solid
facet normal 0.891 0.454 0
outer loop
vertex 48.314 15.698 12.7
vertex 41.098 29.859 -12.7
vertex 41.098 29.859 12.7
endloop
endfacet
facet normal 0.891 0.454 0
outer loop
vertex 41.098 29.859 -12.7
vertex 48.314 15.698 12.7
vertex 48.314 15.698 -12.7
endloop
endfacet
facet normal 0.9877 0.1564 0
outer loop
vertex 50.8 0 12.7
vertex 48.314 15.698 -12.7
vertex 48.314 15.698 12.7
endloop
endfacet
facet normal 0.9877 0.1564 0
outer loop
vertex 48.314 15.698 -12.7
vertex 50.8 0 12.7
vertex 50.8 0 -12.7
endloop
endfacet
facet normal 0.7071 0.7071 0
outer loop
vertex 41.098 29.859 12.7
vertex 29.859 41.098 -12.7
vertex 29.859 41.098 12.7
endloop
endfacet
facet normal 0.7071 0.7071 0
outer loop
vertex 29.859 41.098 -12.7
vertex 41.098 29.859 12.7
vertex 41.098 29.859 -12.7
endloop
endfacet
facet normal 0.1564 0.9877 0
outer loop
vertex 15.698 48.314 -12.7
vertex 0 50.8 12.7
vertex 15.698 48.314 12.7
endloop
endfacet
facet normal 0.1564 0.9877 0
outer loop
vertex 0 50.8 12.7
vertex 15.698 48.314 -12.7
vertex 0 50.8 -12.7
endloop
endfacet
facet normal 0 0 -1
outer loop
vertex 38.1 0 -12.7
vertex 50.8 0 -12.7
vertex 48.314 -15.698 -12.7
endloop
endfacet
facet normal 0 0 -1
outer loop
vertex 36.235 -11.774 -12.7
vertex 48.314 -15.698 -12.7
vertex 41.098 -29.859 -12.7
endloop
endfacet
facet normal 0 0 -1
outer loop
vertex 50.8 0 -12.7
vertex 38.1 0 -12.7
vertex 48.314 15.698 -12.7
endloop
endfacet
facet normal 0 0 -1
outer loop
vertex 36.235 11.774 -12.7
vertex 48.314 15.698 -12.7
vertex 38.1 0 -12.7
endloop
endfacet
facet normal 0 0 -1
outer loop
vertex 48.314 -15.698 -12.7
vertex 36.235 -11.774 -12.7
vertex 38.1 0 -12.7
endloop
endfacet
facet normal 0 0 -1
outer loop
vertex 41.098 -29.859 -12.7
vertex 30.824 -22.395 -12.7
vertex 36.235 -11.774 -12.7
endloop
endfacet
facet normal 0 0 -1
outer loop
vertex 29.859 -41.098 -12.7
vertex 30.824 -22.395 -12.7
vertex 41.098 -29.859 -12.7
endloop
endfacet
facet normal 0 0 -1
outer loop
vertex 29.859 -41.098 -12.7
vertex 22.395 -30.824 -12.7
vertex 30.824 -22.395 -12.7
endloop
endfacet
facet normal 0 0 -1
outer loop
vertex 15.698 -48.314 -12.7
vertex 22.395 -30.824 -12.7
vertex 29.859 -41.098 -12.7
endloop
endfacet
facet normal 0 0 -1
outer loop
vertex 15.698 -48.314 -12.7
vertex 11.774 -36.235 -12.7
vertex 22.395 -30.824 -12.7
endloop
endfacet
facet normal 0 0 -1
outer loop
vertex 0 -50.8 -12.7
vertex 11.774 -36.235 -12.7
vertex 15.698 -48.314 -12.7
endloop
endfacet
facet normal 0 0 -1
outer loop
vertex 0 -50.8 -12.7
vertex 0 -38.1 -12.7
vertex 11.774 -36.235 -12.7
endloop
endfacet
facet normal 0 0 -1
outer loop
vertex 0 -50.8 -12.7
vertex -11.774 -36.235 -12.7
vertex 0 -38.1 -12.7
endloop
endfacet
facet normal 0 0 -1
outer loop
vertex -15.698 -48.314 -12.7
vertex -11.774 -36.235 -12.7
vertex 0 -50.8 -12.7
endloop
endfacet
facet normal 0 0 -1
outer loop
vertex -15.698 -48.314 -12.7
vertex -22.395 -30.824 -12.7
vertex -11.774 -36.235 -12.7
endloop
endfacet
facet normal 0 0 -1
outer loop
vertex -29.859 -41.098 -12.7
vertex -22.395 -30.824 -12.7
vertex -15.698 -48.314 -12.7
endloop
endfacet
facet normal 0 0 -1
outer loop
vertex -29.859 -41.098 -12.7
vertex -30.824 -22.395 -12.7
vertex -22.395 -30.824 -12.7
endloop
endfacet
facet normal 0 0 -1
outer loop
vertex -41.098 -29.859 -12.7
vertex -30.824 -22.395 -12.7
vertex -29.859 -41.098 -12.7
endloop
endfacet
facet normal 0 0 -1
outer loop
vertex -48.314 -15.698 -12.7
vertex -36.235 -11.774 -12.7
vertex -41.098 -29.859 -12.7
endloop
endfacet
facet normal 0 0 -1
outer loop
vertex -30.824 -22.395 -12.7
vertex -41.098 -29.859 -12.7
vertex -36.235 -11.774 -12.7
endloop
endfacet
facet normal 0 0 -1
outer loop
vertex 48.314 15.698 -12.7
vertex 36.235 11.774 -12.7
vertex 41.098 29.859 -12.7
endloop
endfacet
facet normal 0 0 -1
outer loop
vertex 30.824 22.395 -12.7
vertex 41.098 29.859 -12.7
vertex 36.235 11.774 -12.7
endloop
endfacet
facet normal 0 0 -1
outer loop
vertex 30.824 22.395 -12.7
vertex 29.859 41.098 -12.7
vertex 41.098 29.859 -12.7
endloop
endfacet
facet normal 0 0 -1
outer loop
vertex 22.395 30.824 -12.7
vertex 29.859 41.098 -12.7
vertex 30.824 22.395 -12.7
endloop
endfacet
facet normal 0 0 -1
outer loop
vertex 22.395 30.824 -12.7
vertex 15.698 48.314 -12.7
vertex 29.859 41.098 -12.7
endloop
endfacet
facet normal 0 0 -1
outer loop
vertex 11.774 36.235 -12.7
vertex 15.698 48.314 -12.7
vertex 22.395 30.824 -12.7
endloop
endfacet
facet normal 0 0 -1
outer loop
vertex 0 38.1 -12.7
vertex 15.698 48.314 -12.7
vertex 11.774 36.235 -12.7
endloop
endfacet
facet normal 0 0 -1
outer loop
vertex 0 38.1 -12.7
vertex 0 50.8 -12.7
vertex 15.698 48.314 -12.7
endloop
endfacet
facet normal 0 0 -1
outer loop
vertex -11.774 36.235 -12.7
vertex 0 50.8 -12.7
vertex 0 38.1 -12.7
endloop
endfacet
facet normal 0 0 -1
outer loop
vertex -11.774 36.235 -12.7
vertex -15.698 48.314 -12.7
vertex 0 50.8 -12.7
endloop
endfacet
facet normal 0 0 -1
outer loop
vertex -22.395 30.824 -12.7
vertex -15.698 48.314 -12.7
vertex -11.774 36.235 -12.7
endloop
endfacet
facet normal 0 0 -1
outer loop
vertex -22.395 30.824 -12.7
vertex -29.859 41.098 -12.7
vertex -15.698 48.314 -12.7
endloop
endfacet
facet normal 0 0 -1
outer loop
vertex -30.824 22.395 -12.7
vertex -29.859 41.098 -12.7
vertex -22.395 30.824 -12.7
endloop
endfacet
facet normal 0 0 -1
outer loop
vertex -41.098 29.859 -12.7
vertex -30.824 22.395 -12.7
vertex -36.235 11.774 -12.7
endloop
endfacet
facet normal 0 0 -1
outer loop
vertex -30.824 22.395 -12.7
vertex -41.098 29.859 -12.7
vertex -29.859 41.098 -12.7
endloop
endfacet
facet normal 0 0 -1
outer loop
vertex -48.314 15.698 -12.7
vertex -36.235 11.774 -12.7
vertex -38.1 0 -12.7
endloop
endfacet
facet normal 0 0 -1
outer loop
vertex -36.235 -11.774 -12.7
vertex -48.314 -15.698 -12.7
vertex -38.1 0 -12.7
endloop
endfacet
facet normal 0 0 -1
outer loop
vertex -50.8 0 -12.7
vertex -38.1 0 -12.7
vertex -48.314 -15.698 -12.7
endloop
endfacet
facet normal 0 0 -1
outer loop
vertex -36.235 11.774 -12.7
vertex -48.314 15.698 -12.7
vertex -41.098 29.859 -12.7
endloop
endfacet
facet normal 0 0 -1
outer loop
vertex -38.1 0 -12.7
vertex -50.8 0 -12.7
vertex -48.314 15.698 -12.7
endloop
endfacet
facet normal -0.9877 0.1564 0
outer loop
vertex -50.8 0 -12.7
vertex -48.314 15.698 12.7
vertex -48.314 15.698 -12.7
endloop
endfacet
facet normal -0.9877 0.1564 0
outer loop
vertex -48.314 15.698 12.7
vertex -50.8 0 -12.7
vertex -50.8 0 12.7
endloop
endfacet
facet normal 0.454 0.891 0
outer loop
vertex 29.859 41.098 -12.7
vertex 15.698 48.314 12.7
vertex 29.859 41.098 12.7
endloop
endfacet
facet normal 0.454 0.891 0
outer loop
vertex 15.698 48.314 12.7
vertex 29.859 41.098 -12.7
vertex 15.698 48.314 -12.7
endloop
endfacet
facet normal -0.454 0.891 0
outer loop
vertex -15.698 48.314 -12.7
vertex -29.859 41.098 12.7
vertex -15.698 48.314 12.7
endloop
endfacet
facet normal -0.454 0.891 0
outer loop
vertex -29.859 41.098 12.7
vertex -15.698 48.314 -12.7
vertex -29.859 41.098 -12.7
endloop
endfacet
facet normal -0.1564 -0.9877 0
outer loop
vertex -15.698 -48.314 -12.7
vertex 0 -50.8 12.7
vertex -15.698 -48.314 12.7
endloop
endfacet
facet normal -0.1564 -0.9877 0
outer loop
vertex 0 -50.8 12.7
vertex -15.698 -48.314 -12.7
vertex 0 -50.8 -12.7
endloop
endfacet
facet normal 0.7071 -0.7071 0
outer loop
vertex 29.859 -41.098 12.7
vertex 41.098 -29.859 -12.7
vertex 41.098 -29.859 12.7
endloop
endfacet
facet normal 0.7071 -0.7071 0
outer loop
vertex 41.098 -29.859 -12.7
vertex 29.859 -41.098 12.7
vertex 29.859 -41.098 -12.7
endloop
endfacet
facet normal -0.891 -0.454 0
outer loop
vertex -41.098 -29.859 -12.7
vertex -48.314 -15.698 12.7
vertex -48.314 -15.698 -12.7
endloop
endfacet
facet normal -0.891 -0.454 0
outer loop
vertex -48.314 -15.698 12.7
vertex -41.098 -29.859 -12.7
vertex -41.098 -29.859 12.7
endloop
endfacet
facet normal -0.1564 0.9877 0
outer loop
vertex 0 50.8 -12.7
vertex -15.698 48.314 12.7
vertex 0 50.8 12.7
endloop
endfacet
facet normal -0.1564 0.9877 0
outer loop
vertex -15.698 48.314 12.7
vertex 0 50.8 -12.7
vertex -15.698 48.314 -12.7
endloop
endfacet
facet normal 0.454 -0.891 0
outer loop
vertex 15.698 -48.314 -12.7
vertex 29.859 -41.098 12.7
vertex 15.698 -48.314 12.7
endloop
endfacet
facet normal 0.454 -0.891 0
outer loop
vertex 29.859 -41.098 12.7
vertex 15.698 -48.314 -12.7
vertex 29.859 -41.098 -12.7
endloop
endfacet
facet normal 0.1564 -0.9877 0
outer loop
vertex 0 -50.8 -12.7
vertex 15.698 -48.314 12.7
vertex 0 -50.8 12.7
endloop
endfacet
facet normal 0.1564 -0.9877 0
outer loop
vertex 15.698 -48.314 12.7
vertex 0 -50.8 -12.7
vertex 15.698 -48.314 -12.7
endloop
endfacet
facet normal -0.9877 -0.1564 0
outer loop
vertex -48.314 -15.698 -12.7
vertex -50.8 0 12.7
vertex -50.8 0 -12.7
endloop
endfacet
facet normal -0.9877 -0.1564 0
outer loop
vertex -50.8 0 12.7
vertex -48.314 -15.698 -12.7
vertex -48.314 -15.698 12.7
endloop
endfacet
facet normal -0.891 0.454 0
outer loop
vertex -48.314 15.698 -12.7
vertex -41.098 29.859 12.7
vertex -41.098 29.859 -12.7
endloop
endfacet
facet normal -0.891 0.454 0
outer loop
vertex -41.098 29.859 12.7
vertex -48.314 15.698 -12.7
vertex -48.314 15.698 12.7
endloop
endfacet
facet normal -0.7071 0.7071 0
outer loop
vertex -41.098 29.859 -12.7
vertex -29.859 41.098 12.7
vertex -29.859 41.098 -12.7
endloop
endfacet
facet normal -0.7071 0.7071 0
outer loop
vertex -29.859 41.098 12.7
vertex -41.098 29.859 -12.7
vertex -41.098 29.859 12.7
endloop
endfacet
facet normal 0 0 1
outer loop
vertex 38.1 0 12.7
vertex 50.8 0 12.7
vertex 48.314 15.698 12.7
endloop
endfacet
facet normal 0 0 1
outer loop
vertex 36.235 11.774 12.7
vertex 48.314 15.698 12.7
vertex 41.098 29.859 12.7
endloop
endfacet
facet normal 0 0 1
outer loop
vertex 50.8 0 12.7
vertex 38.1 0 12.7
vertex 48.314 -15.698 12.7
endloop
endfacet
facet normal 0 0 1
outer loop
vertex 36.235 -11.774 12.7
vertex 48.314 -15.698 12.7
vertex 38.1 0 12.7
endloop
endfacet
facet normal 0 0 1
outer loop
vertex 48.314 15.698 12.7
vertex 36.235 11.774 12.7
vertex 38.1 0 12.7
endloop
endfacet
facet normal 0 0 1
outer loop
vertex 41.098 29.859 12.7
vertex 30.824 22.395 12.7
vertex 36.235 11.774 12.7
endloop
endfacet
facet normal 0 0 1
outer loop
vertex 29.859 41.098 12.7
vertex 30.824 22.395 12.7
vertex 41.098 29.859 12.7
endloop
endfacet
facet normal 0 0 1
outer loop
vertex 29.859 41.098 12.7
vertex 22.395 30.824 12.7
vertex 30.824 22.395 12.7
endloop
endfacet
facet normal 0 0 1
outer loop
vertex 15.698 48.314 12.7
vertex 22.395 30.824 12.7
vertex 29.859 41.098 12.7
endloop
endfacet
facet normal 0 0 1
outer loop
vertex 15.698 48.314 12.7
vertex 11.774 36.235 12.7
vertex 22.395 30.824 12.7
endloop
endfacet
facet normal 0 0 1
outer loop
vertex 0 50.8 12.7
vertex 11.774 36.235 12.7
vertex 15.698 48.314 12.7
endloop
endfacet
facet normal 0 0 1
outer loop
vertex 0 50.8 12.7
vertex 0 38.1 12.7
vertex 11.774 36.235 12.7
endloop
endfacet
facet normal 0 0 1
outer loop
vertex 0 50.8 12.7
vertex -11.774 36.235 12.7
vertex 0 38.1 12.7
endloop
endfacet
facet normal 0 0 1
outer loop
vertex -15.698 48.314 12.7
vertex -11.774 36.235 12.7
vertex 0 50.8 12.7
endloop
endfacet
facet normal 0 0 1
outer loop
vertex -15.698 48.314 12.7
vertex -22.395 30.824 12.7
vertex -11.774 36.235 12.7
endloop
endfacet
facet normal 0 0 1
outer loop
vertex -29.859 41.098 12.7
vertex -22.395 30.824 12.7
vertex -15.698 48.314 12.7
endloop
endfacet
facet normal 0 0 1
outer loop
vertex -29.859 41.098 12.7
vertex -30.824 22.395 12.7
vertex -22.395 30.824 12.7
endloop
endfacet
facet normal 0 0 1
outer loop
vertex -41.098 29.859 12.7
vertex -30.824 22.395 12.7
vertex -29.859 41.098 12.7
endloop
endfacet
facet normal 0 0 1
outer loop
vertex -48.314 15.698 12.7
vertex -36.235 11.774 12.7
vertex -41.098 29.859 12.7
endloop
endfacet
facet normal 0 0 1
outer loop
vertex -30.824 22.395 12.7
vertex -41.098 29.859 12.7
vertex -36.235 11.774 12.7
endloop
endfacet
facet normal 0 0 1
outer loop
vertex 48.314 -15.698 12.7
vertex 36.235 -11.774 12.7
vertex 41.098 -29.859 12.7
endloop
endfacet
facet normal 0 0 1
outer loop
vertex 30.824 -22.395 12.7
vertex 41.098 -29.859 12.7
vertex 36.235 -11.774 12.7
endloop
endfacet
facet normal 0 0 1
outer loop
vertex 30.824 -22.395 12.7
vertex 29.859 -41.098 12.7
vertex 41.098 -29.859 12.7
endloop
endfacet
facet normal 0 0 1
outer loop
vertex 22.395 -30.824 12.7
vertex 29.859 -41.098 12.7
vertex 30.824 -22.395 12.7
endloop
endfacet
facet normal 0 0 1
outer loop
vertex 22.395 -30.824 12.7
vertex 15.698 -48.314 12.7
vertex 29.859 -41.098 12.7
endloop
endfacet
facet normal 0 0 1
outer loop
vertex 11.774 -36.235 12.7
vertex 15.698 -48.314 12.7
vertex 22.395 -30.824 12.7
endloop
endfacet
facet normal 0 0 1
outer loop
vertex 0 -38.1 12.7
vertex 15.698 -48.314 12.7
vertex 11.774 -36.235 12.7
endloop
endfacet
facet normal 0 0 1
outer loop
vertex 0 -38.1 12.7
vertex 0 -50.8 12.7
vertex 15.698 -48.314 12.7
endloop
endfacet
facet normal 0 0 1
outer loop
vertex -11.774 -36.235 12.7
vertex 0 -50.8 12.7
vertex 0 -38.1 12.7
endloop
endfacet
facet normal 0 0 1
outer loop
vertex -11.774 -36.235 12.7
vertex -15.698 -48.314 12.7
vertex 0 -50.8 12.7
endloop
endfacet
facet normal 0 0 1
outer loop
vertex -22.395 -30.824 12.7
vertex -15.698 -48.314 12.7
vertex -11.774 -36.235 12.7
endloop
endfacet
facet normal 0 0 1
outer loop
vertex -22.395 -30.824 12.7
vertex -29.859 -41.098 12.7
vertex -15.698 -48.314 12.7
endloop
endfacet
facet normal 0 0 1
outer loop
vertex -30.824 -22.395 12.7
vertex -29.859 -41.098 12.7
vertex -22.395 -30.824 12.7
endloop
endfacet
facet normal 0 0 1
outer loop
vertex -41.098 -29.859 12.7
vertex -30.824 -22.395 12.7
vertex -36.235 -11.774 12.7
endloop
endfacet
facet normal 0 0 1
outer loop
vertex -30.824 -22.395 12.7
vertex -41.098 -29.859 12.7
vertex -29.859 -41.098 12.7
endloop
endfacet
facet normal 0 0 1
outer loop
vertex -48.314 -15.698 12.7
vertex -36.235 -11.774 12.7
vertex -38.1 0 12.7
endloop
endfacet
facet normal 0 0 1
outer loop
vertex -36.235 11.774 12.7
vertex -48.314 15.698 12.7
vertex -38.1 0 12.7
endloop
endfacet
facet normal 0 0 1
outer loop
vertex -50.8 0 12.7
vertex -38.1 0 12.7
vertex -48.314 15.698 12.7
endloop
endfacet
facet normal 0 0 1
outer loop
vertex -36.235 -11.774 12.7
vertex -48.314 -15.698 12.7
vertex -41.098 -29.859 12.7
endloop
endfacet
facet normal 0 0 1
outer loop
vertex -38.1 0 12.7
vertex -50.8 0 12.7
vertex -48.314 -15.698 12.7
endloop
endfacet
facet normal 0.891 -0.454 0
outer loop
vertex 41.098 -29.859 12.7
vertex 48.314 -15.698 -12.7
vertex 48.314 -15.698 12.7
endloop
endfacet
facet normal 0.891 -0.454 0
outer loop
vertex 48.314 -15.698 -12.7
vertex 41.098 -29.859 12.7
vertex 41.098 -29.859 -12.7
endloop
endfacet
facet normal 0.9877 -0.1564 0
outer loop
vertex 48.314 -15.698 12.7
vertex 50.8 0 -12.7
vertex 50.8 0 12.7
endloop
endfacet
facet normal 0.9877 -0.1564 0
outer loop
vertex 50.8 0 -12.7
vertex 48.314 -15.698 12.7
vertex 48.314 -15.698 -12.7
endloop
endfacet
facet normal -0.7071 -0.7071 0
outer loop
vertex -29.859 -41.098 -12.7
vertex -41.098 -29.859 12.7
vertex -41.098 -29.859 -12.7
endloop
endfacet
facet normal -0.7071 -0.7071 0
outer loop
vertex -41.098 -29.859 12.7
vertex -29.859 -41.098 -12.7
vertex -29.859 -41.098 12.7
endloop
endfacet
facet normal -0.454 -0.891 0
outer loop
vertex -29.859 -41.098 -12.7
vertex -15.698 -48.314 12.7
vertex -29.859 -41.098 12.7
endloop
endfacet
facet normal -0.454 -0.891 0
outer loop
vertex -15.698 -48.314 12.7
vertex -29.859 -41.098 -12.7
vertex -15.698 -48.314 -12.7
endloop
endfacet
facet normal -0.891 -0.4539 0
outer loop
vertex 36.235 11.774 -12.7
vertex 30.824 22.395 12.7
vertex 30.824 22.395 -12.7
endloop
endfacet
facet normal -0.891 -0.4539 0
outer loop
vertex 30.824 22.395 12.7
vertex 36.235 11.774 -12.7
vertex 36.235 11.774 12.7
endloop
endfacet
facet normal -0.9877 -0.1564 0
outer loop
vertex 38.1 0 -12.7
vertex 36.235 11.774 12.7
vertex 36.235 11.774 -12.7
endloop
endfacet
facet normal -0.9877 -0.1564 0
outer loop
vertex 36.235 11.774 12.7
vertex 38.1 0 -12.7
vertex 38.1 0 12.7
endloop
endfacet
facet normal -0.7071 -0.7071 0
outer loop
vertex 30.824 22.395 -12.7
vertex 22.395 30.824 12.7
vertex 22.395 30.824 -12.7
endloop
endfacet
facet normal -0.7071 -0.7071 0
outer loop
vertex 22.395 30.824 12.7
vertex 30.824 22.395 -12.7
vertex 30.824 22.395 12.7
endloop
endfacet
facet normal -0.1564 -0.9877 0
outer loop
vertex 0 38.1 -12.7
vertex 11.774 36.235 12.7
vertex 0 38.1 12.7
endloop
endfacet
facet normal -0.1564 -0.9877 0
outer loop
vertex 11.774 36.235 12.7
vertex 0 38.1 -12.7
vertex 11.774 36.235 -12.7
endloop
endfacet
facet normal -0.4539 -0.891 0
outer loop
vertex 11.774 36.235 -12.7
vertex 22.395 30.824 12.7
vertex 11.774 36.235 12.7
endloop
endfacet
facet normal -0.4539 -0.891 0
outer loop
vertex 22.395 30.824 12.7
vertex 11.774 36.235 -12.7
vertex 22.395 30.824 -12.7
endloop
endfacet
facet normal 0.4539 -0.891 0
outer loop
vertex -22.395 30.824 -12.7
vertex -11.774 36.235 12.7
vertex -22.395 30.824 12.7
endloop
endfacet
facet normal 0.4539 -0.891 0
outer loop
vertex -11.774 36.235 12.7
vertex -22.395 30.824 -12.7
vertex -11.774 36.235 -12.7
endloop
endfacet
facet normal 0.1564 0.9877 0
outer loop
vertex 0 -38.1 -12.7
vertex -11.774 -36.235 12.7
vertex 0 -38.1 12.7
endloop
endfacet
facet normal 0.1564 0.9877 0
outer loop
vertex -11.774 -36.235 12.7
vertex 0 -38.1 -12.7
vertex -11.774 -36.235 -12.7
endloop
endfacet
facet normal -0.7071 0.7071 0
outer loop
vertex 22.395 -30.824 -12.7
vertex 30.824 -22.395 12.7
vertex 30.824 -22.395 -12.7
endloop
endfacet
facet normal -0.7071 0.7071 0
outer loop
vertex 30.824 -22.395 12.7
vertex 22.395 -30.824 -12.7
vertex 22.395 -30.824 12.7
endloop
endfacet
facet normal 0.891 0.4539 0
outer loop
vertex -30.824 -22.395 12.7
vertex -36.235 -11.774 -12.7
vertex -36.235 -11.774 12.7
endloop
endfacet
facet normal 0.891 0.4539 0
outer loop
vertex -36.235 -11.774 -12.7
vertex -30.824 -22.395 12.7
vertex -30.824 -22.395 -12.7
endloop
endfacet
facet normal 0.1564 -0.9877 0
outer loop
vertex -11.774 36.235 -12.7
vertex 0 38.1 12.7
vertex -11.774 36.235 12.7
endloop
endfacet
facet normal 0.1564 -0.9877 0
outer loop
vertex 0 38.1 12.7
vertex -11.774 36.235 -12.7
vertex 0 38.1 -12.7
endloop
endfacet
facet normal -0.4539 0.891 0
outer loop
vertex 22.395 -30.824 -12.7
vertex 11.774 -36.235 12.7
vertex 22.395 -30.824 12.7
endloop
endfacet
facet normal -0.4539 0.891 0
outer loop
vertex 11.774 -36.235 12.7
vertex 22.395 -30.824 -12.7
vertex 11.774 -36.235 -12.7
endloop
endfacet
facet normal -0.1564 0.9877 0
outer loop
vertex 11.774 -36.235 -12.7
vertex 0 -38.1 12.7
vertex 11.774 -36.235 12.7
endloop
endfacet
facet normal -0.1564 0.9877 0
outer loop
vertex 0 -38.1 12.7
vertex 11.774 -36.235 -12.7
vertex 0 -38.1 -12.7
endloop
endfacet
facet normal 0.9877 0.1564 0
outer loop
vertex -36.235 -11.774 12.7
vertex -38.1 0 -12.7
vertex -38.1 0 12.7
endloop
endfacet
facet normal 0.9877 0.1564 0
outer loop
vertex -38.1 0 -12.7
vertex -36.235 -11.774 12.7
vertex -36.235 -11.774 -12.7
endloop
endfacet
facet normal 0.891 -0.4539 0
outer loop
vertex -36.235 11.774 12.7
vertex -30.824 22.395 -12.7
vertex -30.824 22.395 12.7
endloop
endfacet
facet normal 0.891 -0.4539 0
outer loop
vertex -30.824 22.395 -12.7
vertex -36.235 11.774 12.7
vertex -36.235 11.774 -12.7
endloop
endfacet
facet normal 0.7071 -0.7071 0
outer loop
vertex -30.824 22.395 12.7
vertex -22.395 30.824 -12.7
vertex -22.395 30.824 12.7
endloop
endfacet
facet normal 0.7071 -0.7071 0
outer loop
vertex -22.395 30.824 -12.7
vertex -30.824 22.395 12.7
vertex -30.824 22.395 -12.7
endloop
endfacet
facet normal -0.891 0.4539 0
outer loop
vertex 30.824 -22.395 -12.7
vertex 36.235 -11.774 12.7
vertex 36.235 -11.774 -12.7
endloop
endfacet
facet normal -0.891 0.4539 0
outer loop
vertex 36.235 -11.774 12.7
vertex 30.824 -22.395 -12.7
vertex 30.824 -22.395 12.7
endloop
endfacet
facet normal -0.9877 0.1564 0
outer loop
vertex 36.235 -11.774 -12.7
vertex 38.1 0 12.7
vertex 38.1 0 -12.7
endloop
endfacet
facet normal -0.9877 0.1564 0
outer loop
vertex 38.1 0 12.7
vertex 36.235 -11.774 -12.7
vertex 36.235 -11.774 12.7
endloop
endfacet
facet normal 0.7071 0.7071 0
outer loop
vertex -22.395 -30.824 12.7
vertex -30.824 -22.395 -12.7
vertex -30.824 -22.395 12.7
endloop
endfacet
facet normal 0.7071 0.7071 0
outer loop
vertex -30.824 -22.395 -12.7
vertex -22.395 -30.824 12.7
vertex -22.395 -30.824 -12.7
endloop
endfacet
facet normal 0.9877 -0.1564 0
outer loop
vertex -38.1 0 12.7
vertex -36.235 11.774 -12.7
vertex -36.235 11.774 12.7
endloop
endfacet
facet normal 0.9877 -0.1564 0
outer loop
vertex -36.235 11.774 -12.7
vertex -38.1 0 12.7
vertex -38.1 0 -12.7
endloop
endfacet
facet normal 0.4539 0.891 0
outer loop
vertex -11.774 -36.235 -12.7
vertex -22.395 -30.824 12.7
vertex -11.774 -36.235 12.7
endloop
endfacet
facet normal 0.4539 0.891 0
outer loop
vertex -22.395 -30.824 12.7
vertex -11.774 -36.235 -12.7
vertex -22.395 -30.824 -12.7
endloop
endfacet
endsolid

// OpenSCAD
include <MCAD/units.scad>

outer_diameter = 4 * inch;
pipe_diameter = 3 * inch;

module base() 
{

  
}

module ring()
{
	difference()
	{
		cylinder(r= outer_diameter/2, h=1*inch, center=true, $fn=20);
		cylinder(r= pipe_diameter/2, h=2*inch, center=true, $fn=20);
	}
}


ring();
